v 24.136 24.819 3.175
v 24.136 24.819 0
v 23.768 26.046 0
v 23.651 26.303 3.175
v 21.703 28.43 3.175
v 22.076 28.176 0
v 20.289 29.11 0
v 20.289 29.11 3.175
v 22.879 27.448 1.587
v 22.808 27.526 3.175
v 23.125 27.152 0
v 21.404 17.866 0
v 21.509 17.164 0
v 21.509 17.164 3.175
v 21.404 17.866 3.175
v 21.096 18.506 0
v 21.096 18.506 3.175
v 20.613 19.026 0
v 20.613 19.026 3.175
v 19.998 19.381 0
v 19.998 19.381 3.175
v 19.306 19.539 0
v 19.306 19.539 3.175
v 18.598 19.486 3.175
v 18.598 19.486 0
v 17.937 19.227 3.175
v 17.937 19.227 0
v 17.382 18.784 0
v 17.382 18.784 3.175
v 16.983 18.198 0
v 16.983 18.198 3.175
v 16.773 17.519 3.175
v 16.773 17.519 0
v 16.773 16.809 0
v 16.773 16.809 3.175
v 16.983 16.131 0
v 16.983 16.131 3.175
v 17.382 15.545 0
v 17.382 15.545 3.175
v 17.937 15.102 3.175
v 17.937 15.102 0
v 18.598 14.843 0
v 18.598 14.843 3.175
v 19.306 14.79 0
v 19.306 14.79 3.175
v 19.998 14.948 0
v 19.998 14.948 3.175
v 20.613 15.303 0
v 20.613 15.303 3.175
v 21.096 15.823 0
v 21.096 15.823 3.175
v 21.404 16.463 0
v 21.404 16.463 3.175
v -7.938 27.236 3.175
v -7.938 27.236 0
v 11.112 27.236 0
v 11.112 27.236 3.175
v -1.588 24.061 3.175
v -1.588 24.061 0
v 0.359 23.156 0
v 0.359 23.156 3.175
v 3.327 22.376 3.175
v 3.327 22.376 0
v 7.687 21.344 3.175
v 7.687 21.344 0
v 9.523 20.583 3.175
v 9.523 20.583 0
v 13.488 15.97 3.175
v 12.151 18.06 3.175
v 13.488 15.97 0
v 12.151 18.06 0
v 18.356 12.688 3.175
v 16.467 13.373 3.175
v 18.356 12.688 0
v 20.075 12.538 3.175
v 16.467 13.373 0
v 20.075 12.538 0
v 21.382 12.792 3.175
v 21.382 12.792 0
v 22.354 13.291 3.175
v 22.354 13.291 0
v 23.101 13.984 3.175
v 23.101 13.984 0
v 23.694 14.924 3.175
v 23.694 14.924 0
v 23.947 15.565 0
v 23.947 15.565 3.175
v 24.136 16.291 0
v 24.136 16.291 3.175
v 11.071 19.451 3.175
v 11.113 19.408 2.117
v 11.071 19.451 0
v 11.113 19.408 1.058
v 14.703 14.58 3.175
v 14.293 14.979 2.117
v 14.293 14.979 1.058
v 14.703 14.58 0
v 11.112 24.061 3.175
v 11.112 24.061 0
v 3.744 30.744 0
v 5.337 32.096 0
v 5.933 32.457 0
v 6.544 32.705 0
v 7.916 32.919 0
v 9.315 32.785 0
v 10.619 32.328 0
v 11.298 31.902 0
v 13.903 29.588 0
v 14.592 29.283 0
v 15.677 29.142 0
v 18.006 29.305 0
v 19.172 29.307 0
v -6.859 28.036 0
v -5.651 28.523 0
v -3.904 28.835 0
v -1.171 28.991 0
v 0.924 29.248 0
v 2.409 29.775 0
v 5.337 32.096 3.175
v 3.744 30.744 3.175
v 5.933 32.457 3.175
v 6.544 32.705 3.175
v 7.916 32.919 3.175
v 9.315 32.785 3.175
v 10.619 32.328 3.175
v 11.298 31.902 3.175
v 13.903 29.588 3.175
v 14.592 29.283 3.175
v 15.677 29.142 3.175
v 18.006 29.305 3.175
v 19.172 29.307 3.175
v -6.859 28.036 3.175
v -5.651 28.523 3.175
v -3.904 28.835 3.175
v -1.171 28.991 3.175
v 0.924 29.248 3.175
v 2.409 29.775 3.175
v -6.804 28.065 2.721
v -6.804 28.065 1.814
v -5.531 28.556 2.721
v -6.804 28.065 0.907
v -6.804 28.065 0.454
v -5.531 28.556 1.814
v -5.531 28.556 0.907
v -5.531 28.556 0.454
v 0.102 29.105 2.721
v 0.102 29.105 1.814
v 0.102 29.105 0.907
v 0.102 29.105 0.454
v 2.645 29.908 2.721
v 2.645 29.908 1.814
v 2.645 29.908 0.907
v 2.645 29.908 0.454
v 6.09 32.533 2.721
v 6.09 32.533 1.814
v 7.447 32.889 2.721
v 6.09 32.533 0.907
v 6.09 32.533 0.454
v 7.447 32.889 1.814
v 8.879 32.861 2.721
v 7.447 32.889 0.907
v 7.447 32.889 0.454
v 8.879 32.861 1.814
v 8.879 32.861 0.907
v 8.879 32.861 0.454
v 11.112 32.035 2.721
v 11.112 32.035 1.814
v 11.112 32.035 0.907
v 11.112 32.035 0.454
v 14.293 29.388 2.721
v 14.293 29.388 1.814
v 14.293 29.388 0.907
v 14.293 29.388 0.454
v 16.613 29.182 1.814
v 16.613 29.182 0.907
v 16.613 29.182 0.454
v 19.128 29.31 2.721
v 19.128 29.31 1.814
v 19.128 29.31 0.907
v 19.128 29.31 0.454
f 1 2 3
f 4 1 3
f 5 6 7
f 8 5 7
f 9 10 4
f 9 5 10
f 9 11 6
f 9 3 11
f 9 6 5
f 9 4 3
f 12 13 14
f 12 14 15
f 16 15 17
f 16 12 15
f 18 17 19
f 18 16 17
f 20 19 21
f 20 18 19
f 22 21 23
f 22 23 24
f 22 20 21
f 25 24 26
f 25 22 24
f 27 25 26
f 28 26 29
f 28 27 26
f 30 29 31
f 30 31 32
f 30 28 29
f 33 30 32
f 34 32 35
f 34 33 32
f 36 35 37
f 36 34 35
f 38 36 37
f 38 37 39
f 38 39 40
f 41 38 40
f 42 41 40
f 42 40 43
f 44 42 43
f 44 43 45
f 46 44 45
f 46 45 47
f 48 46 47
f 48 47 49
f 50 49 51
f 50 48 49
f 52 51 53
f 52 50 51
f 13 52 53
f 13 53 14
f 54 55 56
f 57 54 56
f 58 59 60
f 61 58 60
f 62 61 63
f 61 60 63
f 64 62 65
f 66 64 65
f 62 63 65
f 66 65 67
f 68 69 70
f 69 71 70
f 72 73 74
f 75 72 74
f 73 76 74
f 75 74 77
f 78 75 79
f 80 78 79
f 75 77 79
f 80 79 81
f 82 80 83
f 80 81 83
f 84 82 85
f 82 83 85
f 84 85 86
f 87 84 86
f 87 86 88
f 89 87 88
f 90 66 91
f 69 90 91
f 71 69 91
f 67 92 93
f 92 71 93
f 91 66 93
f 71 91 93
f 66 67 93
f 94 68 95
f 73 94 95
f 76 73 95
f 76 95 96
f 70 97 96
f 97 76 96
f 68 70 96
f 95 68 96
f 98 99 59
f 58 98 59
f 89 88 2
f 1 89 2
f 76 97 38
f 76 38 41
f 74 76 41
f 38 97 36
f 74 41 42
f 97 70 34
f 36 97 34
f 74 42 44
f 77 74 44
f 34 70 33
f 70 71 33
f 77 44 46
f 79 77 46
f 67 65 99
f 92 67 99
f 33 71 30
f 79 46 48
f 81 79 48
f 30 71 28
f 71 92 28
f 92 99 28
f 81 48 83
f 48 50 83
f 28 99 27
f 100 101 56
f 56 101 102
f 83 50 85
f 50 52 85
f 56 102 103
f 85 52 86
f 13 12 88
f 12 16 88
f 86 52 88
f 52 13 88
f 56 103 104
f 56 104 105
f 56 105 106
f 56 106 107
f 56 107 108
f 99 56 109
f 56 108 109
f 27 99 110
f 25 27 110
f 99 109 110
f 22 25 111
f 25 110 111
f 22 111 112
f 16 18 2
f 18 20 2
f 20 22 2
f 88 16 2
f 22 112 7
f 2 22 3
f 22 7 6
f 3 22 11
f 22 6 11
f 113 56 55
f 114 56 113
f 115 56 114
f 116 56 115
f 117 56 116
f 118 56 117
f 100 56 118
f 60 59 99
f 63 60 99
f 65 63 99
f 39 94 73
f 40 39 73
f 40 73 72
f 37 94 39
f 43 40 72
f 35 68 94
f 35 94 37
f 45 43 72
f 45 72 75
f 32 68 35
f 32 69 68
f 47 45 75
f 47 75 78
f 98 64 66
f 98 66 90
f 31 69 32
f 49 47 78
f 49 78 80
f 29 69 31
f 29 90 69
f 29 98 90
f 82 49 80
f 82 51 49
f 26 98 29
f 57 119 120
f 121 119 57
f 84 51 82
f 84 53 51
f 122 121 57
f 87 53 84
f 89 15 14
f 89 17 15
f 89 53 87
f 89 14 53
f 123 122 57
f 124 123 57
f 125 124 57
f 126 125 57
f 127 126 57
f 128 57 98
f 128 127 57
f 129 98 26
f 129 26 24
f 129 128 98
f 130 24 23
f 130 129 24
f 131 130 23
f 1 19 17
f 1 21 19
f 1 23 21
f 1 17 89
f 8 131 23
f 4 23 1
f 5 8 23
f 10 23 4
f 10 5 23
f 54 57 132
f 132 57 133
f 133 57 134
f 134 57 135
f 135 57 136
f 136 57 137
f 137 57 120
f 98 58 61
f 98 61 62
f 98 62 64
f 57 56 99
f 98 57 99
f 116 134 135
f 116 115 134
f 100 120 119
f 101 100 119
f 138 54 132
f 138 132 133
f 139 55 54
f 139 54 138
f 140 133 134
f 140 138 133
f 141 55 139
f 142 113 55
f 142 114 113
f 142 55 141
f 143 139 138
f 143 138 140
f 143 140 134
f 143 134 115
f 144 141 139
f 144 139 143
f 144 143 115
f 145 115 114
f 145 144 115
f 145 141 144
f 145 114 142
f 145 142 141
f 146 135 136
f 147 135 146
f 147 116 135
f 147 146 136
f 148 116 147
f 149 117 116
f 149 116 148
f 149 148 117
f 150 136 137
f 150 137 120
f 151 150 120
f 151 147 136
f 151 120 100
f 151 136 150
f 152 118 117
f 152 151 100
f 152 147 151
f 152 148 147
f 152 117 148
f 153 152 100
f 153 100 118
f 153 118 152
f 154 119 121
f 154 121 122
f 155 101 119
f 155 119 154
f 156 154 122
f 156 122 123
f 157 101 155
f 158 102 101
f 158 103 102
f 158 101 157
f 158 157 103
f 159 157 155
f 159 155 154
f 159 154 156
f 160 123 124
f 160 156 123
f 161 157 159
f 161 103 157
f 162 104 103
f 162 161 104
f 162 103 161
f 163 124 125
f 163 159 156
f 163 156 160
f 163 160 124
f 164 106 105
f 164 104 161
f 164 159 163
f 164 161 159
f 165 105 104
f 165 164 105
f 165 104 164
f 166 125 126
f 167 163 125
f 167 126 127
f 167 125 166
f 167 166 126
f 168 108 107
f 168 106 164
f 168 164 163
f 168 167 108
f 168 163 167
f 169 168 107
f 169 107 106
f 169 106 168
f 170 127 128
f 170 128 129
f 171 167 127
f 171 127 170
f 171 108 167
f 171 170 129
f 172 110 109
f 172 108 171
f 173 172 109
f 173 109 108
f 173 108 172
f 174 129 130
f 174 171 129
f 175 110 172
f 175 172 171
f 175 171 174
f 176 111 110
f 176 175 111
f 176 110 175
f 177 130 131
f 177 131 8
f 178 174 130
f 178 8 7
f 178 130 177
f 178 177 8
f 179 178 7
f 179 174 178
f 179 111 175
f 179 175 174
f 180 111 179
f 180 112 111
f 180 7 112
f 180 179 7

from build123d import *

# Parameters (mm, degrees)
SKETCH1_R           = 2.38125
BOSS_EXTRUDE1_DEPTH = 3.175
CUT_EXTRUDE1_DEPTH  = 41.943448555


with BuildPart() as part:
    # Sketch1 → Boss-Extrude1 (new body)
    with BuildSketch(Plane.XY):
        with BuildLine():
            Line((-7.9375, 27.235546875), (11.1125, 27.235546875))
            Line((11.1125, 27.235546875), (11.1125, 24.060546875))
            Line((11.1125, 24.060546875), (-1.5875, 24.060546875))
            add(Edge.make_bspline(
                [(-1.5875, 24.060546875), (2.018825623, 21.799419545), (10.633002779, 22.702913031), (14.444449363, 12.395288116), (23.070537685, 11.025750537), (24.136484021, 16.291183817)],
                knots=[0, 0, 0, 0, 0.438351695, 0.615086988, 1, 1, 1, 1], degree=3))
            Line((24.136484021, 16.291183817), (24.136484021, 28.431274529))
            add(Edge.make_bspline(
                [(-7.9375, 27.235546875), (-5.138848496, 29.986604457), (1.482017793, 27.321515058), (5.396027486, 32.794490027), (8.77853623, 33.057647792), (11.779327256, 32.034629922), (14.10742643, 28.280525974), (19.416746163, 30.094957124), (22.364415365, 28.20701954), (24.136484021, 28.431274529)],
                knots=[0, 0, 0, 0, 0.316709121, 0.442153112, 0.523486204, 0.592442824, 0.712295484, 0.852347032, 1, 1, 1, 1], degree=3))
        make_face()
        with Locations((19.128076736, 17.164397364)):
            Circle(SKETCH1_R, mode=Mode.SUBTRACT)
    extrude(amount=BOSS_EXTRUDE1_DEPTH)

    # Sketch2 → Cut-Extrude1 (cut, through all)
    with BuildSketch(Plane.XY.offset(3.175)):
        with BuildLine():
            Line((20.289143392, 29.109894753), (24.692953489, 31.442360813))
            Line((24.692953489, 31.442360813), (27.797759172, 27.509606949))
            Line((27.797759172, 27.509606949), (24.136484021, 24.818775358))
            add(Edge.make_bspline(
                [(24.136484021, 24.818775358), (23.545622288, 27.931703018), (20.289143392, 29.109894753)],
                knots=[0, 0, 0, 1, 1, 1], degree=2))
        make_face()
    extrude(amount=-CUT_EXTRUDE1_DEPTH, mode=Mode.SUBTRACT)


solid = part.part
